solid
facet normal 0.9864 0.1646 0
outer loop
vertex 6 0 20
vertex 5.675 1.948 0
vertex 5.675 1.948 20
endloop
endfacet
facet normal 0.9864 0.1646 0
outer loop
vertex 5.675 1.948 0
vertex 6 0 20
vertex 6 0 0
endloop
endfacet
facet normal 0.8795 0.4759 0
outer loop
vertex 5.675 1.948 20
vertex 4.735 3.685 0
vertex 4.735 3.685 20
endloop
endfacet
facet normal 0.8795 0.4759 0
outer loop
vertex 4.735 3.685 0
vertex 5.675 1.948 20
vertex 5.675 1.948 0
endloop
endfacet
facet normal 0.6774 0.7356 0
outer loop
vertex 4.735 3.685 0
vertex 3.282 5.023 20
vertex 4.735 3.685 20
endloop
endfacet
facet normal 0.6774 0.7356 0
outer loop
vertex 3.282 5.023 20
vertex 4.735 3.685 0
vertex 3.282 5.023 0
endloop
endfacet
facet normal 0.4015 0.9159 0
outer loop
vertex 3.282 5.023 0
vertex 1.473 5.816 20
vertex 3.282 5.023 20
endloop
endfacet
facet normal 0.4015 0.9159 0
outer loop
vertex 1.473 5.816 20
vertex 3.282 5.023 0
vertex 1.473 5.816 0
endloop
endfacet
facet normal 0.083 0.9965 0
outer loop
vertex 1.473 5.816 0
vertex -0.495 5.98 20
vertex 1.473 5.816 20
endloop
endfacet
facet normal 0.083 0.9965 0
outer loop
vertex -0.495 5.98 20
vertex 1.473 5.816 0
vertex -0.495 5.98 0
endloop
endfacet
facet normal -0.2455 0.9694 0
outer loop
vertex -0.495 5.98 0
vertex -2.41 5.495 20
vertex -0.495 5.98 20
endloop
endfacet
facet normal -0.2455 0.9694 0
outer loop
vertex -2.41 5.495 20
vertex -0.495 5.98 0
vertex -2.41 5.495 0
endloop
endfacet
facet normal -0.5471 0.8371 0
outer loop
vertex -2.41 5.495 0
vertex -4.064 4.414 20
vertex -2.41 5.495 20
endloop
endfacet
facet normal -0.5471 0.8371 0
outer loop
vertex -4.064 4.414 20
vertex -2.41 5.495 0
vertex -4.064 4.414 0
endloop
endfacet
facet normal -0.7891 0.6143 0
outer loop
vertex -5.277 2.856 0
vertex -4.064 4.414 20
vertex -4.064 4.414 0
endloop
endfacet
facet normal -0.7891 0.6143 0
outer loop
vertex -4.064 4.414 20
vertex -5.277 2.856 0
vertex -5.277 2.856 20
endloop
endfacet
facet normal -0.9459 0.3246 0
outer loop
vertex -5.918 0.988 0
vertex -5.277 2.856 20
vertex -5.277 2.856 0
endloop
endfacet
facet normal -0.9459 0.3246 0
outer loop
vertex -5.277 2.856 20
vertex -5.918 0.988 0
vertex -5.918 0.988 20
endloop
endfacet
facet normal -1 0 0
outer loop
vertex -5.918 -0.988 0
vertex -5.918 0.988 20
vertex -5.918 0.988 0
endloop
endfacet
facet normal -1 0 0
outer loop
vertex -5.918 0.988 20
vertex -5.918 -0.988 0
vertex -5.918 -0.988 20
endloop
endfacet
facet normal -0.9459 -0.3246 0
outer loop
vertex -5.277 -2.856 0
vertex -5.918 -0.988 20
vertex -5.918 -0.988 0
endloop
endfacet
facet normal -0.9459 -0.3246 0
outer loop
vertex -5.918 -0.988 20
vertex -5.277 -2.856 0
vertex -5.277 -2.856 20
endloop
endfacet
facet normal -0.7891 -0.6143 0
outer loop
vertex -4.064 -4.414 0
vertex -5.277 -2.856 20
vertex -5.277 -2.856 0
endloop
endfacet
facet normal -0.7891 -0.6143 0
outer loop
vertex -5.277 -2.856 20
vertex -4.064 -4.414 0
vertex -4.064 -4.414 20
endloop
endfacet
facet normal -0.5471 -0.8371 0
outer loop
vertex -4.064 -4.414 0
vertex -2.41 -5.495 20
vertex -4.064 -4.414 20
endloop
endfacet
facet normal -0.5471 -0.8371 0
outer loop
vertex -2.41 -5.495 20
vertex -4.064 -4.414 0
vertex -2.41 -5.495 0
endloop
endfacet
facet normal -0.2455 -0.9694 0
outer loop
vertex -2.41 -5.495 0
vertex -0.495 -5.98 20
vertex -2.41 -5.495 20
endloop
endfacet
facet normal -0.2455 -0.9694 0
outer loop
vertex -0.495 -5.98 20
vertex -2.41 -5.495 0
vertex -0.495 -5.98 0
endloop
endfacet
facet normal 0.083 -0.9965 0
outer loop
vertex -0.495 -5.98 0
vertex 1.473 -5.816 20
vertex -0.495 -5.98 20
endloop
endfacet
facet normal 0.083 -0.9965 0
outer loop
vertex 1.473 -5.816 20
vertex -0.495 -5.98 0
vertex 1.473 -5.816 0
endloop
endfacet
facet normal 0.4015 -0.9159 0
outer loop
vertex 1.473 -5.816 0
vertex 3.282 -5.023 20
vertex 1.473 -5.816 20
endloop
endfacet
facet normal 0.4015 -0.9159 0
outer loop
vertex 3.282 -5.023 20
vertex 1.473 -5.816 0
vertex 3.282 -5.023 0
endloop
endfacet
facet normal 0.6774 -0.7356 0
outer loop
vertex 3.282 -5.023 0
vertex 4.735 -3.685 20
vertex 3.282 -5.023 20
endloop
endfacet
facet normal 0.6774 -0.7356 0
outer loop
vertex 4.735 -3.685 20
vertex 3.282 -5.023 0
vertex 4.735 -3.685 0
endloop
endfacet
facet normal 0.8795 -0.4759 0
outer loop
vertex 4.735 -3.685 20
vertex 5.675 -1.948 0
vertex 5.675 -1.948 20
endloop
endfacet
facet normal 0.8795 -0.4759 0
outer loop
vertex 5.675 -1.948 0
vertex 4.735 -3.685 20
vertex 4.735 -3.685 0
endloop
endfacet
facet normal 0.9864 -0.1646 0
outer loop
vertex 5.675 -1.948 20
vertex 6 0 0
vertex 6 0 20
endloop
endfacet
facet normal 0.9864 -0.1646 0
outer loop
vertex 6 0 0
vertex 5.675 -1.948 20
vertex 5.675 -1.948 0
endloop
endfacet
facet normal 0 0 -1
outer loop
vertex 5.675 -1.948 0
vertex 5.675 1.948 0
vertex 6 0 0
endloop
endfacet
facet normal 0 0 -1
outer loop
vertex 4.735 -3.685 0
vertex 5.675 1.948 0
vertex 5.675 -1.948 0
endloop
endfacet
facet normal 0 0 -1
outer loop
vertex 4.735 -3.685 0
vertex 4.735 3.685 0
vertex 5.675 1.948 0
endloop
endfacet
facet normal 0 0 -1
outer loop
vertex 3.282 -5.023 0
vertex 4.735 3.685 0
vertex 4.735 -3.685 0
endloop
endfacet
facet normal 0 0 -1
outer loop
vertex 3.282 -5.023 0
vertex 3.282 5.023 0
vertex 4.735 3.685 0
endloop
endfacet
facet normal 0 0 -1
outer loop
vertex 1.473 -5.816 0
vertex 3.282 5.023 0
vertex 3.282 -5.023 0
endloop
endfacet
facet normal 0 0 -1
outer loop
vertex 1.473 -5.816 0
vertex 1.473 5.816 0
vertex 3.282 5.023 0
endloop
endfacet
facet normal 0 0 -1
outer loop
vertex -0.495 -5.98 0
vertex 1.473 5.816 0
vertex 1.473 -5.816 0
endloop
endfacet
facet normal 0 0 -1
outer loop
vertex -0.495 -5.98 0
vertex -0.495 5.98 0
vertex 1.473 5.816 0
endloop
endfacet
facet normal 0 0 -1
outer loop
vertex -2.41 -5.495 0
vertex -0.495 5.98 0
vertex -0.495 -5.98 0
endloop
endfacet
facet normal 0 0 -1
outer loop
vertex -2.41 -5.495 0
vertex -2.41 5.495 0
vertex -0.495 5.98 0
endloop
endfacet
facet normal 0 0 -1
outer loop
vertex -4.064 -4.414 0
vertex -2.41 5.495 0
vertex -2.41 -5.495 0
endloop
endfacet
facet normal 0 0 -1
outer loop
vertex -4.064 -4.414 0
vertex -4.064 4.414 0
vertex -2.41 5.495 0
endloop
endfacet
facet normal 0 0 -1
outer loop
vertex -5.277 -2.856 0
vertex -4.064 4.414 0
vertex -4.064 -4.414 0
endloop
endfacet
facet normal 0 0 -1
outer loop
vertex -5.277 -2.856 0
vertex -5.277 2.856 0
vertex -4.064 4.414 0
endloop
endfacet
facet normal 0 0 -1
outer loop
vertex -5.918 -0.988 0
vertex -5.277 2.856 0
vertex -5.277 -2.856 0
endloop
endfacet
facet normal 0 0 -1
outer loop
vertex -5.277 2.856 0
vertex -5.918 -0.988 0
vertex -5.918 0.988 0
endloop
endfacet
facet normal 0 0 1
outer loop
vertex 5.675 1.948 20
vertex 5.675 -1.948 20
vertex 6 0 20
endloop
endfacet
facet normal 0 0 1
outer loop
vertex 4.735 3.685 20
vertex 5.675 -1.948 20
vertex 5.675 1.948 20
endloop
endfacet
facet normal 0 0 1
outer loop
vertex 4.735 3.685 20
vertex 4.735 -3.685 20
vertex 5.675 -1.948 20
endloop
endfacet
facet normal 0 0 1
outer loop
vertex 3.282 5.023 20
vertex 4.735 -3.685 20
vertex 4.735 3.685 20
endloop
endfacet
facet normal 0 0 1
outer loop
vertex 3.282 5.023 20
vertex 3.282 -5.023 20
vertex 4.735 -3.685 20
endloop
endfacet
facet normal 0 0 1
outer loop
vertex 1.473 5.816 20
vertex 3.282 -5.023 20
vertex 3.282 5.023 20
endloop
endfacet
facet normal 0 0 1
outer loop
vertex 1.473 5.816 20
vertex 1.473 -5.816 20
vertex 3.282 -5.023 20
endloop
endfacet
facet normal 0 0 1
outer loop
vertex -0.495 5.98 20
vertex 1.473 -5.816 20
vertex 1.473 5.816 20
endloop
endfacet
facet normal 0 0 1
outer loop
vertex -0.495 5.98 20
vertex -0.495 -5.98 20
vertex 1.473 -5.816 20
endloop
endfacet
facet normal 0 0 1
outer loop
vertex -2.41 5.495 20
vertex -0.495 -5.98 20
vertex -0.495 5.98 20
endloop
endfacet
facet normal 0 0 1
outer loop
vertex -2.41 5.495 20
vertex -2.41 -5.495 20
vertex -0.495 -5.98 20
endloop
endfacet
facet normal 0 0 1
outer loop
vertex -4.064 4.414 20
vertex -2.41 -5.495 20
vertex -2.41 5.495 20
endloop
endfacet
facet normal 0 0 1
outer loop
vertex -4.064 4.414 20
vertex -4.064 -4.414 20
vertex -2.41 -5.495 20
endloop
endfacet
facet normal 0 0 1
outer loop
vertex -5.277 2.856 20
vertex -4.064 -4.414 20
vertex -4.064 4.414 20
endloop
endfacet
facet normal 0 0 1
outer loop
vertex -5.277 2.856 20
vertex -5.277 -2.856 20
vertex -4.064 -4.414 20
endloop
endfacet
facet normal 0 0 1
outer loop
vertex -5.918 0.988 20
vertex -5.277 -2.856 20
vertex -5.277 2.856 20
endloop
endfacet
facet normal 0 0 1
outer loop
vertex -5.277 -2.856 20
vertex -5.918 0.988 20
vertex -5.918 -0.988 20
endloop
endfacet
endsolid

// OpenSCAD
// CAD model: medium_circular_pin
// === CYLINDER PARAMETERS ===
cylinder_diameter = 12;
cylinder_height = 20;

translate([0, 0, 0])
cylinder(h = cylinder_height, d = cylinder_diameter);
